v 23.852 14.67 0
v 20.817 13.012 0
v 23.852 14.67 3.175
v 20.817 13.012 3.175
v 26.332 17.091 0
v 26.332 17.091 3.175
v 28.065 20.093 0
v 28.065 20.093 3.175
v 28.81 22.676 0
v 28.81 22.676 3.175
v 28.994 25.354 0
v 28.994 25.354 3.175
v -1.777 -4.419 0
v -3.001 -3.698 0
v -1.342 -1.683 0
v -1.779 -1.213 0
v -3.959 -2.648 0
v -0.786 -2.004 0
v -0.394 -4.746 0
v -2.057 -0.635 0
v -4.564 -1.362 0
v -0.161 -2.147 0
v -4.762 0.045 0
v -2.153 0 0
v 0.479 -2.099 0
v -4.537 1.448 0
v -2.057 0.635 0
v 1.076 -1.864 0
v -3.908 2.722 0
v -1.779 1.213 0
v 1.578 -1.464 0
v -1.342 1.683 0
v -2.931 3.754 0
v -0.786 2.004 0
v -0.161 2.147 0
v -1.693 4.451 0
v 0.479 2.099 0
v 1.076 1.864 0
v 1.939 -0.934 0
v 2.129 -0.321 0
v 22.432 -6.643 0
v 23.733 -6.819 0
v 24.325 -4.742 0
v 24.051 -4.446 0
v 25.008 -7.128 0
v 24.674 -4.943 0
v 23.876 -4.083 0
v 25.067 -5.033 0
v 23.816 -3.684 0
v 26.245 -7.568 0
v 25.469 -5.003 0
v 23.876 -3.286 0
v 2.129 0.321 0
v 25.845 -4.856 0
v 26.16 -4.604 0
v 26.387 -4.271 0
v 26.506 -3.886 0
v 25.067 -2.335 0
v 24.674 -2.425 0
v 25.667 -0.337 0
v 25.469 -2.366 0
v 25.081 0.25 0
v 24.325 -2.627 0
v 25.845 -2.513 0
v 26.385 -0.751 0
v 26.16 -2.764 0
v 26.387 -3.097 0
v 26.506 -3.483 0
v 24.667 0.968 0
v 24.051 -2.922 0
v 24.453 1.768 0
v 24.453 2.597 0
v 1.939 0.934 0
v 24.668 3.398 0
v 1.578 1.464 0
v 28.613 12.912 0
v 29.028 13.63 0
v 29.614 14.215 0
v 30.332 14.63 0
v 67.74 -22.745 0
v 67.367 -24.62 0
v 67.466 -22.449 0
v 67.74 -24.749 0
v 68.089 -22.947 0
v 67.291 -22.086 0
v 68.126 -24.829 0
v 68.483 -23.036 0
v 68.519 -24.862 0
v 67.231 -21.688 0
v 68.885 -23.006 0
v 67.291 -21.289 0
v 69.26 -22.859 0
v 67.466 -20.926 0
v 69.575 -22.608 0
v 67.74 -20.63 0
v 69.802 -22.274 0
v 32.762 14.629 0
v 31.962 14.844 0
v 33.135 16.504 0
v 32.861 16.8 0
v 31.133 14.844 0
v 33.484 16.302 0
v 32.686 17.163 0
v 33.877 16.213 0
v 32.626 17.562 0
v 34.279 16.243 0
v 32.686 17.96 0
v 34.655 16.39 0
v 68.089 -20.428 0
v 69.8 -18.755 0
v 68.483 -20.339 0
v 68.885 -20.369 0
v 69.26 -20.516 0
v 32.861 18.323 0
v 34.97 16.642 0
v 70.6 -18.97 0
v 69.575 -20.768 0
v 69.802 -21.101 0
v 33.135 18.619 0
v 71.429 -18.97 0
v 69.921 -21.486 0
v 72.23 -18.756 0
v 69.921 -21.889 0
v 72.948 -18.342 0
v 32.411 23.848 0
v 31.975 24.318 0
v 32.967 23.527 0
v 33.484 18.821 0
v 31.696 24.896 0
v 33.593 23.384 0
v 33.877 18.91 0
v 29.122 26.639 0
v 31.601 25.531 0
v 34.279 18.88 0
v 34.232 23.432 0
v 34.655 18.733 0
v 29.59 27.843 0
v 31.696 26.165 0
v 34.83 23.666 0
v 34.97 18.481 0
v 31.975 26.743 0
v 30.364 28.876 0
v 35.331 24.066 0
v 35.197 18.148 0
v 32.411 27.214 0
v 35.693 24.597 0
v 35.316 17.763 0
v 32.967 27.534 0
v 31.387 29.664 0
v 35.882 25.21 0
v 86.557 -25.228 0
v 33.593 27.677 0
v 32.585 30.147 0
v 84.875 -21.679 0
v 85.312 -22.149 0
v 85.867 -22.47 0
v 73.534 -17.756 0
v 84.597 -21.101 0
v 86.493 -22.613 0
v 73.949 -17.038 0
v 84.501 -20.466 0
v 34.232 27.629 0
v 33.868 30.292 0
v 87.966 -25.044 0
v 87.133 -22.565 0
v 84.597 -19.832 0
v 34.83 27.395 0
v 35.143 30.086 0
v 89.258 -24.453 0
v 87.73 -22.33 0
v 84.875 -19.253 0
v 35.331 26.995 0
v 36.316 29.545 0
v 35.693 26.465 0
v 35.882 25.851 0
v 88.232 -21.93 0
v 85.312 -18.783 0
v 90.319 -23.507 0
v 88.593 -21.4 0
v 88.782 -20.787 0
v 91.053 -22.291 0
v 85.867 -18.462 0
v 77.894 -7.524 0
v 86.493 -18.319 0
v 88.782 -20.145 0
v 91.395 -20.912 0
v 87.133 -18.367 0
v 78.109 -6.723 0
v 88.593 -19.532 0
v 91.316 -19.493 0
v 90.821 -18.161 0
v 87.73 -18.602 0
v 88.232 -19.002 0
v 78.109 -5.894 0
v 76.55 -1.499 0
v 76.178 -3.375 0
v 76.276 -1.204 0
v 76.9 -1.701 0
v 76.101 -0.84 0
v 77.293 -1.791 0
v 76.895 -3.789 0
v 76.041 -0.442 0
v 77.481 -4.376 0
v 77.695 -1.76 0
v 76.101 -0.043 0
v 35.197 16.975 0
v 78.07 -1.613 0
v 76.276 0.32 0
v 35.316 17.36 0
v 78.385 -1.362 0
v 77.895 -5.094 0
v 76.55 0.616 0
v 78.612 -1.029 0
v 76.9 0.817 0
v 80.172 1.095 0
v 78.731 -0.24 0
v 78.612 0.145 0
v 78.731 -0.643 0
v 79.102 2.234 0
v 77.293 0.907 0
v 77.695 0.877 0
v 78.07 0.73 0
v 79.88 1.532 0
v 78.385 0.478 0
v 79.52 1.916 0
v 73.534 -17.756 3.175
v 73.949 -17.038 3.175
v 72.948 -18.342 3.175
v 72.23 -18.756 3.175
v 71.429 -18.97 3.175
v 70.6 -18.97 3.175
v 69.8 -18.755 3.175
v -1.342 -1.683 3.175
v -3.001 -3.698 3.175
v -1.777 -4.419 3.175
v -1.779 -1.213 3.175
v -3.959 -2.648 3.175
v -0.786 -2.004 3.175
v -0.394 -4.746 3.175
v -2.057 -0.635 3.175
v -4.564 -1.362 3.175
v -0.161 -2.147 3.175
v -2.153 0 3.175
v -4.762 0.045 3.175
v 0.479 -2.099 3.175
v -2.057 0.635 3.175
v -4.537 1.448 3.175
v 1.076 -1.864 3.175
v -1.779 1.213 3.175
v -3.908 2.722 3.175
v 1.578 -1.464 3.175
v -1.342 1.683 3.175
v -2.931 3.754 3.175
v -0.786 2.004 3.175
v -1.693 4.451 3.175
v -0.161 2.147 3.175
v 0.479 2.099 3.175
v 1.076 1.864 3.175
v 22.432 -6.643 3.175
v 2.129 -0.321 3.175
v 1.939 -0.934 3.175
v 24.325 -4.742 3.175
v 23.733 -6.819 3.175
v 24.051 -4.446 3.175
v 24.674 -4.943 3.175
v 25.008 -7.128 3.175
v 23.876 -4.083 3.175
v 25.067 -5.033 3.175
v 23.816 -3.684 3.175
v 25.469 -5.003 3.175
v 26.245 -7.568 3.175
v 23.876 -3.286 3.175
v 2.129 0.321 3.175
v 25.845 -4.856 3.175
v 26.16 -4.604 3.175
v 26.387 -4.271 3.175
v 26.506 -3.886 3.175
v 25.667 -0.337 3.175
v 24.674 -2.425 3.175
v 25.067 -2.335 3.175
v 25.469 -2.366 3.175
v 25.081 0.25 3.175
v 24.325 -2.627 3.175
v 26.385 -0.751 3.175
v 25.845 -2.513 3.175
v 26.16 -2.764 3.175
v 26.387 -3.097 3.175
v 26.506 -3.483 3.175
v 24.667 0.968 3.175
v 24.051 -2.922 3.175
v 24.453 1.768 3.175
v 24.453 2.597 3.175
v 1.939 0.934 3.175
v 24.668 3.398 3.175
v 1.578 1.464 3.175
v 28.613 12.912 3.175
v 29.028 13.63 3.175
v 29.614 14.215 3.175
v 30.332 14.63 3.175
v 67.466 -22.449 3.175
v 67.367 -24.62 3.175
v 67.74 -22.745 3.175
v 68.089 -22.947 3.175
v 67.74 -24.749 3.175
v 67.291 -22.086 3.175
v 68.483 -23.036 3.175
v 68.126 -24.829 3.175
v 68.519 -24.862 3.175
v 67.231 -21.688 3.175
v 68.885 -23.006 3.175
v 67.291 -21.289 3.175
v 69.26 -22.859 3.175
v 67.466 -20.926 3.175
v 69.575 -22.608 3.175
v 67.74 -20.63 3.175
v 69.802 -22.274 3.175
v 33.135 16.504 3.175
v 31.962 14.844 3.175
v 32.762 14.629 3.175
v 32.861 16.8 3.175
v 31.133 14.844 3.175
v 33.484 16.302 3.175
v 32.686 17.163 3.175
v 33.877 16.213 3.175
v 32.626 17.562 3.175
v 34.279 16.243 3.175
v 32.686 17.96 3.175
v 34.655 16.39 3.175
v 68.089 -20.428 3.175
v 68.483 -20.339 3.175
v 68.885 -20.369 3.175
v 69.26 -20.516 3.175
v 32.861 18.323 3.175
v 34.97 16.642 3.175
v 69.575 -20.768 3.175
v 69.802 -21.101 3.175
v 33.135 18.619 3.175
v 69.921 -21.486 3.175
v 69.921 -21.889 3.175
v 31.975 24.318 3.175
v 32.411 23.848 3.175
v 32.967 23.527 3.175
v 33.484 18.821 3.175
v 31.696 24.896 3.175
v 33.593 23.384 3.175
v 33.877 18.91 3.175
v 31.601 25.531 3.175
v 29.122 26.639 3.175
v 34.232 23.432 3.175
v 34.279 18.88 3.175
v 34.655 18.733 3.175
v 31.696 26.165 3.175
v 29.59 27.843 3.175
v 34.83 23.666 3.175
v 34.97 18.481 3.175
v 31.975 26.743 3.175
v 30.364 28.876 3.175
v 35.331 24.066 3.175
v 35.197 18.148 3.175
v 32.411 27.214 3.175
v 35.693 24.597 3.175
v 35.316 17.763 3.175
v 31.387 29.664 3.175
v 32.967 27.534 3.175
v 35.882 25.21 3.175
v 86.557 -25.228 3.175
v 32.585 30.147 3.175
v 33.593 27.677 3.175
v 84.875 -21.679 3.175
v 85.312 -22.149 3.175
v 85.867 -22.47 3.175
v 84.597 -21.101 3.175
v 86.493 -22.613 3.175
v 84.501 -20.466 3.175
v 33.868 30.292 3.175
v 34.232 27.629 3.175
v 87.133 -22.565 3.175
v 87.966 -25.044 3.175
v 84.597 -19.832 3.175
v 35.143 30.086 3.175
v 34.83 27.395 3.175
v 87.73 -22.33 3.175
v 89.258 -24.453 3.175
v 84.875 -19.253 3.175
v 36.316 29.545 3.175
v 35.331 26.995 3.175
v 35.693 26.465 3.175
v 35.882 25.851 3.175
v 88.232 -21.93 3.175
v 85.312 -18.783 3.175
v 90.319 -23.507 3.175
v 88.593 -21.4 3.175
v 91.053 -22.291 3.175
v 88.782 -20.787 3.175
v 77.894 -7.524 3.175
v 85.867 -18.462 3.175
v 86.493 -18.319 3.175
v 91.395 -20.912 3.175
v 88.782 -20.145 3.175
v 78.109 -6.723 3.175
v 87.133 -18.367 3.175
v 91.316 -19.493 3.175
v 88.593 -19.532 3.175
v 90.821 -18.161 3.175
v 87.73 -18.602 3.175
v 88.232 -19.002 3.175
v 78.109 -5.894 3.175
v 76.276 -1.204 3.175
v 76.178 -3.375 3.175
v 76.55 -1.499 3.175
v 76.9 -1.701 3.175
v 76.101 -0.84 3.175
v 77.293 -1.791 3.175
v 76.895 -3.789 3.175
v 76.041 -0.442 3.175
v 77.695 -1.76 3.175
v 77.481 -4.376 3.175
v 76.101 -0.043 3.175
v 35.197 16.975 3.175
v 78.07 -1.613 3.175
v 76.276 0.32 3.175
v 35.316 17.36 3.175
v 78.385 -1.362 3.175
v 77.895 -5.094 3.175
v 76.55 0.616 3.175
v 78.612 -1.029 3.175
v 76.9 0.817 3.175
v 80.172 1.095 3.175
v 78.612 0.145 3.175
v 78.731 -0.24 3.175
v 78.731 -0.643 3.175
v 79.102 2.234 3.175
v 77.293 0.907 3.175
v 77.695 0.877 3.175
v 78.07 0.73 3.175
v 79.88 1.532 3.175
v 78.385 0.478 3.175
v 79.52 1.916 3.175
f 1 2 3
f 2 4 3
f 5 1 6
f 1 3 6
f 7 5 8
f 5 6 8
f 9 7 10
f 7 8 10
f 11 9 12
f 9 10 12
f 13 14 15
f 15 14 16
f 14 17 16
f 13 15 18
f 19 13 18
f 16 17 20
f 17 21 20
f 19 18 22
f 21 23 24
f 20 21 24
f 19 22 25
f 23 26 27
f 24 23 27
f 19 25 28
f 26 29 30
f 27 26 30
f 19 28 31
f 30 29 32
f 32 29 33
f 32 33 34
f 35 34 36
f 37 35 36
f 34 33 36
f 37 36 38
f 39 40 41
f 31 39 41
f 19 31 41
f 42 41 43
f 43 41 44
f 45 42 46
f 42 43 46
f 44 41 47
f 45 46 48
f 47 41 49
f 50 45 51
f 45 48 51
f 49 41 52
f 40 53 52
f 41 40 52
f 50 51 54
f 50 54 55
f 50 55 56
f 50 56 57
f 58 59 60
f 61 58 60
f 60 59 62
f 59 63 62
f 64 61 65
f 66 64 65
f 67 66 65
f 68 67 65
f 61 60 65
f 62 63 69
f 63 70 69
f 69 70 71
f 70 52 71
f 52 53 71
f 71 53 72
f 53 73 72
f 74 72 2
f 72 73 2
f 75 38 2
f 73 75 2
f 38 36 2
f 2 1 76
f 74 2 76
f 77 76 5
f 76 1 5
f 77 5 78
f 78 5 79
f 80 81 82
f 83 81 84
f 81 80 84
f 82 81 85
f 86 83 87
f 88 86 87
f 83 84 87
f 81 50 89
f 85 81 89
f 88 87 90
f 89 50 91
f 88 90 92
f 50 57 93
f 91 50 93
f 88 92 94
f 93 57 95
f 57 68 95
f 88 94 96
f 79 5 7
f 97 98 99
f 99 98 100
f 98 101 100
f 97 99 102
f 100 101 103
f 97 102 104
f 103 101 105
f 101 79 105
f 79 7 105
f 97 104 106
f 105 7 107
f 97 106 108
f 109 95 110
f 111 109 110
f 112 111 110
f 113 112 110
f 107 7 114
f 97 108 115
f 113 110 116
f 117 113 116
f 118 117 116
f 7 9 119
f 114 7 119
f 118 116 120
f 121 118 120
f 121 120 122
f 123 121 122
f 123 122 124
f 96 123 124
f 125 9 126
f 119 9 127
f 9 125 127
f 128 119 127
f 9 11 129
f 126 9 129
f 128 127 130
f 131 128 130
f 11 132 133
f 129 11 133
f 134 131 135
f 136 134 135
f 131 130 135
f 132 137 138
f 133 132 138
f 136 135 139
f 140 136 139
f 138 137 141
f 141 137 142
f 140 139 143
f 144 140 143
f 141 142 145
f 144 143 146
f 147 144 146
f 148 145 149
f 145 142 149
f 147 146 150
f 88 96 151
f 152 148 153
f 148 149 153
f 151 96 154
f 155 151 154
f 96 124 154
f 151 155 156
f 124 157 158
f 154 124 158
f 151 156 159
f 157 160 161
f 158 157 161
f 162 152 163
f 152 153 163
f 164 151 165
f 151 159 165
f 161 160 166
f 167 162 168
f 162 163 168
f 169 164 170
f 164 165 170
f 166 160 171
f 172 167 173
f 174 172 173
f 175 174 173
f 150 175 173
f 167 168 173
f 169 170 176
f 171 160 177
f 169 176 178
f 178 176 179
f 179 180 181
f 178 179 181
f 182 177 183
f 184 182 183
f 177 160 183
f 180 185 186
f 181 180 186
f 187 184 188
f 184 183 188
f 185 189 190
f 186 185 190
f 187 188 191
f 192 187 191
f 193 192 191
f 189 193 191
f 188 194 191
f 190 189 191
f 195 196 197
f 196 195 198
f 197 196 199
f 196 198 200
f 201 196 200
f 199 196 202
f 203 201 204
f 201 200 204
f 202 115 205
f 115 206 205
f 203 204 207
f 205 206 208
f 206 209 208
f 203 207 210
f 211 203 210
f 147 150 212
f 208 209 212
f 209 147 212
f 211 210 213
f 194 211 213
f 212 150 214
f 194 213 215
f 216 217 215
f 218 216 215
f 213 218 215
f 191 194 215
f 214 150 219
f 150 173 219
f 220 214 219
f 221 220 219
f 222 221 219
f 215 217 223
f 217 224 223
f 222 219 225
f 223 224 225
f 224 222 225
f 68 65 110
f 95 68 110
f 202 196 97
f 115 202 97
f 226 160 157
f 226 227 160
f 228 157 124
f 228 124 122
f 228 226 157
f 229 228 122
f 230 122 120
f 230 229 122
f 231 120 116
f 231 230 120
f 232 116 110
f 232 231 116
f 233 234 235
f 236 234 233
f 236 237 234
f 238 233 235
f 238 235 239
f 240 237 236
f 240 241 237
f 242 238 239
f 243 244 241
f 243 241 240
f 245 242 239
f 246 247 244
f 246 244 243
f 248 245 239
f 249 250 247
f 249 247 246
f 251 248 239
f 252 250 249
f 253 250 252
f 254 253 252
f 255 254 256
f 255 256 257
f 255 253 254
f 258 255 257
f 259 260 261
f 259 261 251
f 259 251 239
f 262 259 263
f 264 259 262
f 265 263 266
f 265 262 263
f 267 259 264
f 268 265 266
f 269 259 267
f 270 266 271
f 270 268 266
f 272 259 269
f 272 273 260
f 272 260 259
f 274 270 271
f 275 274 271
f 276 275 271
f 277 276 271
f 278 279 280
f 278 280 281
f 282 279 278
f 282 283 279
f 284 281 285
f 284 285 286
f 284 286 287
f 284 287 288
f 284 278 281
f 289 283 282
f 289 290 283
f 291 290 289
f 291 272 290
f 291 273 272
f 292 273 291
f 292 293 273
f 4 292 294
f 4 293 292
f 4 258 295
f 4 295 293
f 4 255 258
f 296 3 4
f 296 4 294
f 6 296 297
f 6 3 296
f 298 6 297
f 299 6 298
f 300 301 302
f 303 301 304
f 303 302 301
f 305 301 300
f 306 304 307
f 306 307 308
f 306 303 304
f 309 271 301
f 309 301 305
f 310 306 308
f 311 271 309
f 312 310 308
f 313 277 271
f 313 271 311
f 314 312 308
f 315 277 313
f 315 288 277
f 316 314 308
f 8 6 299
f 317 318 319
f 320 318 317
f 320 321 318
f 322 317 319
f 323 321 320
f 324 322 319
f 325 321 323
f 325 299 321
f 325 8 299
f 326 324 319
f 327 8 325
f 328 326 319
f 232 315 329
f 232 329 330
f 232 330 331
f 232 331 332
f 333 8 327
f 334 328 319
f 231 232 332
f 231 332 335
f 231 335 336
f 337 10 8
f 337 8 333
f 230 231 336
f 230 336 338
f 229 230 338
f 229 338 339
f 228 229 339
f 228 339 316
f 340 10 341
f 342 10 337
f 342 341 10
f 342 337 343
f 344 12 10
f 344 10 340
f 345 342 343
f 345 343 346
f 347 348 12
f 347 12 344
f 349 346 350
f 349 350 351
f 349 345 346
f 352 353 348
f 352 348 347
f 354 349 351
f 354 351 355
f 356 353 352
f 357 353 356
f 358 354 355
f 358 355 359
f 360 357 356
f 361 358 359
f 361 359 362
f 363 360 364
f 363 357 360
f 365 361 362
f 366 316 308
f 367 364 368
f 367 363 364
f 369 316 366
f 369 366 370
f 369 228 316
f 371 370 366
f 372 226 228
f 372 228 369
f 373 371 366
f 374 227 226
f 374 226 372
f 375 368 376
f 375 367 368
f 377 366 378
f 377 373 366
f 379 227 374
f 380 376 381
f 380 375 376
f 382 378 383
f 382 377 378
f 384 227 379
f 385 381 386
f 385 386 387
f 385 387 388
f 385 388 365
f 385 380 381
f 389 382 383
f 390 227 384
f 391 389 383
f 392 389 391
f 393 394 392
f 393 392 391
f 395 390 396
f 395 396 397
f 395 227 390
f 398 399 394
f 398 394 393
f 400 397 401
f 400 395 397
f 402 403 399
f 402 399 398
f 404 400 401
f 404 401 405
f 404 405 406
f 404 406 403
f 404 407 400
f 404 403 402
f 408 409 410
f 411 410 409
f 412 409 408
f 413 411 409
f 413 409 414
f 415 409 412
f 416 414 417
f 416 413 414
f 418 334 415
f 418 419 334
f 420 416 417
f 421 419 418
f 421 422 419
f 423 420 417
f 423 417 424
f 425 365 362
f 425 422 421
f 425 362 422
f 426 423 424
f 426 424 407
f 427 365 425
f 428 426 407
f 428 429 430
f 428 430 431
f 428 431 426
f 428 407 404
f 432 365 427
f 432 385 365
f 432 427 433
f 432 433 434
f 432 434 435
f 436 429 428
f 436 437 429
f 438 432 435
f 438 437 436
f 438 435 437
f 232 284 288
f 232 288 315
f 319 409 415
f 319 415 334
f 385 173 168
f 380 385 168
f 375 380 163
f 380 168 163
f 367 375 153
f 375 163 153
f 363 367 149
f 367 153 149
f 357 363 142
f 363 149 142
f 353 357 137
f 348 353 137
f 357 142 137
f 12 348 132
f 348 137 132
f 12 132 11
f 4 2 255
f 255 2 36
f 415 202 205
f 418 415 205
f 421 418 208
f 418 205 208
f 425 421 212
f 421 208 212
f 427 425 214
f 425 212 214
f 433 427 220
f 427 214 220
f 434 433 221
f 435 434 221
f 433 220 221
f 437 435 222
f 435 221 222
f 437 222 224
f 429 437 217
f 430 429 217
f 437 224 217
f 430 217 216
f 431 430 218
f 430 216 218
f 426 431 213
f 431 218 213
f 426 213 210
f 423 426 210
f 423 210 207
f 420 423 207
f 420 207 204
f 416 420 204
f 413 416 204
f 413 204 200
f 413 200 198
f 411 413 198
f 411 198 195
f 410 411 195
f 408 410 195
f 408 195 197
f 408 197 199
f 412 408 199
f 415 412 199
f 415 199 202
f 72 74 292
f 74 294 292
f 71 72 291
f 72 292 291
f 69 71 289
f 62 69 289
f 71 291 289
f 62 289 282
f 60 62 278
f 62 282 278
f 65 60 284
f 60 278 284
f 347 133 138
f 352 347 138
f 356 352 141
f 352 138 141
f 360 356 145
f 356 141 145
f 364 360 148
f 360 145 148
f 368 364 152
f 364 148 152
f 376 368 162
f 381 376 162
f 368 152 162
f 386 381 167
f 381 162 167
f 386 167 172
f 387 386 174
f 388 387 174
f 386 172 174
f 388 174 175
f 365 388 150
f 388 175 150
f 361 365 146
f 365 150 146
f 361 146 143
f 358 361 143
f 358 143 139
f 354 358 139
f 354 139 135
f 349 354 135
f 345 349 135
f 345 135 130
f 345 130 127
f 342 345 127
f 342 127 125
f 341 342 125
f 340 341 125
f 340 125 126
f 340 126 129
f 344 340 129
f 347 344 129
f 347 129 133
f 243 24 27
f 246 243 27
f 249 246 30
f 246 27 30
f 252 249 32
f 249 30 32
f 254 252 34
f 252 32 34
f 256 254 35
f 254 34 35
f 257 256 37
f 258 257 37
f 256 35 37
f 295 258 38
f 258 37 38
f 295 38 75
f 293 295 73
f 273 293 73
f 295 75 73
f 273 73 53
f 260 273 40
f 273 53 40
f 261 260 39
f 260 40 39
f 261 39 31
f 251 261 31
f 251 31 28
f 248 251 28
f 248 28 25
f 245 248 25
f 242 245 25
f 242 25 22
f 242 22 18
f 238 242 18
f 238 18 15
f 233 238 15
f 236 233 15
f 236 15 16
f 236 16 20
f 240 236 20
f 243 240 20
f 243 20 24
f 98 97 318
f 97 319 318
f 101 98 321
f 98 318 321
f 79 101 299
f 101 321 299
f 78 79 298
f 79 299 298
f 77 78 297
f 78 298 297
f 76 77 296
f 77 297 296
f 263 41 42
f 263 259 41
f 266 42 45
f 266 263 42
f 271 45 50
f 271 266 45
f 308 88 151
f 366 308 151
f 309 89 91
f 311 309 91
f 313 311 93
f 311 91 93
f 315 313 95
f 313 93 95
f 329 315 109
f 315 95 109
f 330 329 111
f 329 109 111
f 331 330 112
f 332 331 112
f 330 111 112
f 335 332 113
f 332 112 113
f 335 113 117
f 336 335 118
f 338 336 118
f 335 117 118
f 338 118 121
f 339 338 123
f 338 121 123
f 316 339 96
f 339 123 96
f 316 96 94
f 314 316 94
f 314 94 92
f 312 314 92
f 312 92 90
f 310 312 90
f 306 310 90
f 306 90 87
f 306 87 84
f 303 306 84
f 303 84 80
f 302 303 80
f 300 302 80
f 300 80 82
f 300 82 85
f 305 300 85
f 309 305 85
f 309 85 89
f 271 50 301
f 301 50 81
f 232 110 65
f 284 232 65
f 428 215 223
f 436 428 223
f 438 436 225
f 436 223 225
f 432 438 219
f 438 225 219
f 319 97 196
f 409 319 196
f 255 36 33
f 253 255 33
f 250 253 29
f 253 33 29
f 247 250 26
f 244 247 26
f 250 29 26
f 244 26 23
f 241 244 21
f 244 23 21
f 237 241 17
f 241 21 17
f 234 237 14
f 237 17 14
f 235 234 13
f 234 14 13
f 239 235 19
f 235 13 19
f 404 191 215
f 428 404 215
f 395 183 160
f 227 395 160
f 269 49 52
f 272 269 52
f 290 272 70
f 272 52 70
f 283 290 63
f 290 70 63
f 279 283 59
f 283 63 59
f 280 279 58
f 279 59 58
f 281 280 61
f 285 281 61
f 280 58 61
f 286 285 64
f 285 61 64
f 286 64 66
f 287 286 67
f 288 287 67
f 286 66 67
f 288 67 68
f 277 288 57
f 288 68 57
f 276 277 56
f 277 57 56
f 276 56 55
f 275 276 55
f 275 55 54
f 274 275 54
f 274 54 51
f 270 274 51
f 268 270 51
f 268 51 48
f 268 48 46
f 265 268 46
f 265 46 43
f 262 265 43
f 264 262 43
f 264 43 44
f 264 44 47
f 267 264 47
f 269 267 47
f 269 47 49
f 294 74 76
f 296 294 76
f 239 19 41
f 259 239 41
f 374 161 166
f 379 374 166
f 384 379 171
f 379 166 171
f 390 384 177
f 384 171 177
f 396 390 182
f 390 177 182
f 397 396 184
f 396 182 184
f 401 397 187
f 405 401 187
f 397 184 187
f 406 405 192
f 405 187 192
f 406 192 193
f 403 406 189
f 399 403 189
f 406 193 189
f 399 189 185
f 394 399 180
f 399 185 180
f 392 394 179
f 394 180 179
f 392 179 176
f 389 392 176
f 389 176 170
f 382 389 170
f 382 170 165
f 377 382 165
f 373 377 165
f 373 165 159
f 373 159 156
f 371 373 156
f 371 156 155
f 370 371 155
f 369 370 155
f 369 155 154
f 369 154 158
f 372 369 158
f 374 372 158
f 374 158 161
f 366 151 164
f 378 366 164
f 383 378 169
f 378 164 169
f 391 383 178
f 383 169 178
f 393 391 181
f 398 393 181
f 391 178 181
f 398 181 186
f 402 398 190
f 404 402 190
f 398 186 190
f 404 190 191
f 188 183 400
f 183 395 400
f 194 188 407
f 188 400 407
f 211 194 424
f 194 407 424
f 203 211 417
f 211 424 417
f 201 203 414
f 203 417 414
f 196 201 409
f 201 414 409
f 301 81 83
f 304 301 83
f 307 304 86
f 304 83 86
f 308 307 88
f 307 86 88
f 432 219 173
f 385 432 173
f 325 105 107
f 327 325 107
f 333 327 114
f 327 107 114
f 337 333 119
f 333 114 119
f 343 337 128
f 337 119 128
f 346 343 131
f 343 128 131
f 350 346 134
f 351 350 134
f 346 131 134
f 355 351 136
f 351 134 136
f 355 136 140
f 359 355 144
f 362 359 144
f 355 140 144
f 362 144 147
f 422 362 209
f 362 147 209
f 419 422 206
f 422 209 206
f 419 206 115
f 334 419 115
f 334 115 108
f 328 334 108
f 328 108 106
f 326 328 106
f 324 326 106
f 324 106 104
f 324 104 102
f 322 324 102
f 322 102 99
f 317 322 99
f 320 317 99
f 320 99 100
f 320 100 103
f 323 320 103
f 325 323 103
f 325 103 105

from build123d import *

# Parameters (mm, degrees)
BOSS_EXTRUDE1_DEPTH   = 3.175
FILLET1_R             = 3.175
F_6_CLEARANCE_HOLE1_D = 4.3053
F_2_CLEARANCE_HOLE1_D = 2.7051
FILLET2_R             = 12.7


with BuildPart() as part:
    # Sketch1 → Boss-Extrude1 (new body)
    with BuildSketch(Plane.XY):
        with BuildLine():
            Line((-0.394361249, -4.746144273), (24.410778081, -6.807224837))
            Line((24.410778081, -6.807224837), (67.367437597, -24.620374852))
            ThreePointArc((67.367437597, -24.620374852), (67.932057441, -24.79496394), (68.519252784, -24.861885891))
            Line((68.519252784, -24.861885891), (86.557178011, -25.22763618))
            ThreePointArc((86.557178011, -25.22763618), (90.731319104, -22.926733092), (90.821358826, -18.161284348))
            Line((90.821358826, -18.161284348), (80.17216718, 1.094759821))
            ThreePointArc((80.17216718, 1.094759821), (79.70833798, 1.731518351), (79.102014267, 2.234480087))
            Line((79.102014267, 2.234480087), (36.315798025, 29.544973103))
            ThreePointArc((36.315798025, 29.544973103), (31.002904726, 29.418519327), (29.114914109, 24.450791758))
            Line((29.114914109, 24.450791758), (30.886207986, 16.841662569))
            Line((30.886207986, 16.841662569), (-1.692935369, 4.451446516))
            ThreePointArc((-1.692935369, 4.451446516), (-4.715731213, -0.6657968), (-0.394361249, -4.746144273))
        make_face()
        Polygon((72.732635266, -19.970882517), (23.451745327, 0.464782063), (29.829511311, 15.844853618), (79.11040125, -4.590810962), align=None, mode=Mode.SUBTRACT)
    extrude(amount=BOSS_EXTRUDE1_DEPTH)

    # Fillet1
    fillet1_edges = [part.edges().sort_by_distance(p)[0] for p in [
        (72.732635266, -19.970882517, 1.5875),
        (79.11040125, -4.590810962, 1.5875),
        (29.829511311, 15.844853618, 1.5875),
        (23.451745327, 0.464782063, 1.5875),
    ]]
    fillet(fillet1_edges, radius=FILLET1_R)

    # #6 Clearance Hole1 (through all)
    with Locations(Plane.XY.offset(3.175)):
        with Locations((0, 0), (33.7533947, 25.530562131), (86.653726131, -20.46611492)):
            Hole(F_6_CLEARANCE_HOLE1_D / 2)

    # #2 Clearance Hole1 (through all)
    with Locations(Plane.XY.offset(3.175)):
        with Locations((33.97852838, 17.561509485), (77.393745383, -0.441793894), (68.583618198, -21.687538385), (25.168401194, -3.684235006)):
            Hole(F_2_CLEARANCE_HOLE1_D / 2)

    # Fillet2
    fillet2_edges = [part.edges().sort_by_distance(p)[0] for p in [
        (24.410778081, -6.807224837, 1.5875),
        (30.886207986, 16.841662569, 1.5875),
    ]]
    fillet(fillet2_edges, radius=FILLET2_R)


solid = part.part
